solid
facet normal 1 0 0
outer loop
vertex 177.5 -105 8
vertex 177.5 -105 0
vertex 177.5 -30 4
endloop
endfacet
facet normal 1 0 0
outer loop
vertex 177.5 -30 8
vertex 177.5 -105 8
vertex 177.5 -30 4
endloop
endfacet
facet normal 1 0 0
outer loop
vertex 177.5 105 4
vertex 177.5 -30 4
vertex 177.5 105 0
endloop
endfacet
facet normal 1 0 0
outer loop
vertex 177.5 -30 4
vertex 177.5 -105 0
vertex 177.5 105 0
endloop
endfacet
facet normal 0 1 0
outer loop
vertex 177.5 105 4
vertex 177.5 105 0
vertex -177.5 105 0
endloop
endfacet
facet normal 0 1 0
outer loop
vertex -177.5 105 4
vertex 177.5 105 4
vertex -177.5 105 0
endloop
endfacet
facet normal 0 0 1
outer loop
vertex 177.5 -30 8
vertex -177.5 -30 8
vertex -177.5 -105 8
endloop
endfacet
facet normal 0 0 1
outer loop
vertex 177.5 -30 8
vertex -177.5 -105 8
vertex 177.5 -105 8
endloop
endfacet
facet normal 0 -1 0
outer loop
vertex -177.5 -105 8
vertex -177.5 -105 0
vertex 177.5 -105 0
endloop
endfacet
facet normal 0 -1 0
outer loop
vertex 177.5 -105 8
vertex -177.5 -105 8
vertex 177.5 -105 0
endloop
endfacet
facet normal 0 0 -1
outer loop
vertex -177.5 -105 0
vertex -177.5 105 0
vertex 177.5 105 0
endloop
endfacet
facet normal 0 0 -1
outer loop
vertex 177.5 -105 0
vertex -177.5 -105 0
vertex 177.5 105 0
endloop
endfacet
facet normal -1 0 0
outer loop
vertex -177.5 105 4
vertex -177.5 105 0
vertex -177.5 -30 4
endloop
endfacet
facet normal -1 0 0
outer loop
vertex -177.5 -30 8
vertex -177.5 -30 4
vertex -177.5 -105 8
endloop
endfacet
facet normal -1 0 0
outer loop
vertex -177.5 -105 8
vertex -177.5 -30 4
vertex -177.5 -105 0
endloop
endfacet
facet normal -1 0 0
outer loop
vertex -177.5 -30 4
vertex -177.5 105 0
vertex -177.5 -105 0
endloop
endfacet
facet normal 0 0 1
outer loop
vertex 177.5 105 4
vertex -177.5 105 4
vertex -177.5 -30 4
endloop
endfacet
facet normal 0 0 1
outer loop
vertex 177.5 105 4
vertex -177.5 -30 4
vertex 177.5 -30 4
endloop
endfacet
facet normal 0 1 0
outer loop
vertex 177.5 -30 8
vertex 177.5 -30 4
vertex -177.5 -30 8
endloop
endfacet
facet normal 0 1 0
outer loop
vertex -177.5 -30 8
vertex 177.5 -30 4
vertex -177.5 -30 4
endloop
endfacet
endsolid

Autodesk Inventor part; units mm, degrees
ref_plane "YZ Plane" through (0, 0, 0) normal (1, 0, 0) x (0, 1, 0)
ref_plane "XZ Plane" through (0, 0, 0) normal (0, 1, 0) x (-1, 0, 0)
ref_plane "XY Plane" through (0, 0, 0) normal (0, 0, 1) x (1, 0, 0)
sketch "Эскиз1" plane through (0, 0, 0) normal (0, 0, 1) x (1, 0, 0)
  line L0 (-177.5, -105) -> (177.5, -105)
  line L1 (177.5, -105) -> (177.5, 105)
  line L2 (177.5, 105) -> (-177.5, 105)
  line L3 (-177.5, 105) -> (-177.5, -105)
  line L4 (-177.5, -105) -> (177.5, 105) construction
  line L5 (177.5, -105) -> (-177.5, 105) construction
  point P0 (0, 0)
  dimension "d0" = 355
  dimension "d1" = 210
extrude "Выдавливание1" add sketch "Эскиз1" along normal blind 4
sketch "Эскиз2" plane through (0, 0, 4) normal (0, 0, 1) x (1, 0, 0)
  line L0 (-177.5, 105) -> (-177.5, -105) projected
  line L1 (177.5, -105) -> (177.5, 105) projected
  line L2 (-177.5, -105) -> (177.5, -105)
  line L3 (177.5, -105) -> (177.5, -30)
  line L4 (177.5, -30) -> (-177.5, -30)
  line L5 (-177.5, -30) -> (-177.5, -105)
  line L6 (177.5, 105) -> (-177.5, 105) projected
  point P0 (0, 0)
  dimension "d4" = 135
extrude "Выдавливание2" add sketch "Эскиз2" along normal blind 4 contours L4 L1 L2 L0
properties part number "монитор"
